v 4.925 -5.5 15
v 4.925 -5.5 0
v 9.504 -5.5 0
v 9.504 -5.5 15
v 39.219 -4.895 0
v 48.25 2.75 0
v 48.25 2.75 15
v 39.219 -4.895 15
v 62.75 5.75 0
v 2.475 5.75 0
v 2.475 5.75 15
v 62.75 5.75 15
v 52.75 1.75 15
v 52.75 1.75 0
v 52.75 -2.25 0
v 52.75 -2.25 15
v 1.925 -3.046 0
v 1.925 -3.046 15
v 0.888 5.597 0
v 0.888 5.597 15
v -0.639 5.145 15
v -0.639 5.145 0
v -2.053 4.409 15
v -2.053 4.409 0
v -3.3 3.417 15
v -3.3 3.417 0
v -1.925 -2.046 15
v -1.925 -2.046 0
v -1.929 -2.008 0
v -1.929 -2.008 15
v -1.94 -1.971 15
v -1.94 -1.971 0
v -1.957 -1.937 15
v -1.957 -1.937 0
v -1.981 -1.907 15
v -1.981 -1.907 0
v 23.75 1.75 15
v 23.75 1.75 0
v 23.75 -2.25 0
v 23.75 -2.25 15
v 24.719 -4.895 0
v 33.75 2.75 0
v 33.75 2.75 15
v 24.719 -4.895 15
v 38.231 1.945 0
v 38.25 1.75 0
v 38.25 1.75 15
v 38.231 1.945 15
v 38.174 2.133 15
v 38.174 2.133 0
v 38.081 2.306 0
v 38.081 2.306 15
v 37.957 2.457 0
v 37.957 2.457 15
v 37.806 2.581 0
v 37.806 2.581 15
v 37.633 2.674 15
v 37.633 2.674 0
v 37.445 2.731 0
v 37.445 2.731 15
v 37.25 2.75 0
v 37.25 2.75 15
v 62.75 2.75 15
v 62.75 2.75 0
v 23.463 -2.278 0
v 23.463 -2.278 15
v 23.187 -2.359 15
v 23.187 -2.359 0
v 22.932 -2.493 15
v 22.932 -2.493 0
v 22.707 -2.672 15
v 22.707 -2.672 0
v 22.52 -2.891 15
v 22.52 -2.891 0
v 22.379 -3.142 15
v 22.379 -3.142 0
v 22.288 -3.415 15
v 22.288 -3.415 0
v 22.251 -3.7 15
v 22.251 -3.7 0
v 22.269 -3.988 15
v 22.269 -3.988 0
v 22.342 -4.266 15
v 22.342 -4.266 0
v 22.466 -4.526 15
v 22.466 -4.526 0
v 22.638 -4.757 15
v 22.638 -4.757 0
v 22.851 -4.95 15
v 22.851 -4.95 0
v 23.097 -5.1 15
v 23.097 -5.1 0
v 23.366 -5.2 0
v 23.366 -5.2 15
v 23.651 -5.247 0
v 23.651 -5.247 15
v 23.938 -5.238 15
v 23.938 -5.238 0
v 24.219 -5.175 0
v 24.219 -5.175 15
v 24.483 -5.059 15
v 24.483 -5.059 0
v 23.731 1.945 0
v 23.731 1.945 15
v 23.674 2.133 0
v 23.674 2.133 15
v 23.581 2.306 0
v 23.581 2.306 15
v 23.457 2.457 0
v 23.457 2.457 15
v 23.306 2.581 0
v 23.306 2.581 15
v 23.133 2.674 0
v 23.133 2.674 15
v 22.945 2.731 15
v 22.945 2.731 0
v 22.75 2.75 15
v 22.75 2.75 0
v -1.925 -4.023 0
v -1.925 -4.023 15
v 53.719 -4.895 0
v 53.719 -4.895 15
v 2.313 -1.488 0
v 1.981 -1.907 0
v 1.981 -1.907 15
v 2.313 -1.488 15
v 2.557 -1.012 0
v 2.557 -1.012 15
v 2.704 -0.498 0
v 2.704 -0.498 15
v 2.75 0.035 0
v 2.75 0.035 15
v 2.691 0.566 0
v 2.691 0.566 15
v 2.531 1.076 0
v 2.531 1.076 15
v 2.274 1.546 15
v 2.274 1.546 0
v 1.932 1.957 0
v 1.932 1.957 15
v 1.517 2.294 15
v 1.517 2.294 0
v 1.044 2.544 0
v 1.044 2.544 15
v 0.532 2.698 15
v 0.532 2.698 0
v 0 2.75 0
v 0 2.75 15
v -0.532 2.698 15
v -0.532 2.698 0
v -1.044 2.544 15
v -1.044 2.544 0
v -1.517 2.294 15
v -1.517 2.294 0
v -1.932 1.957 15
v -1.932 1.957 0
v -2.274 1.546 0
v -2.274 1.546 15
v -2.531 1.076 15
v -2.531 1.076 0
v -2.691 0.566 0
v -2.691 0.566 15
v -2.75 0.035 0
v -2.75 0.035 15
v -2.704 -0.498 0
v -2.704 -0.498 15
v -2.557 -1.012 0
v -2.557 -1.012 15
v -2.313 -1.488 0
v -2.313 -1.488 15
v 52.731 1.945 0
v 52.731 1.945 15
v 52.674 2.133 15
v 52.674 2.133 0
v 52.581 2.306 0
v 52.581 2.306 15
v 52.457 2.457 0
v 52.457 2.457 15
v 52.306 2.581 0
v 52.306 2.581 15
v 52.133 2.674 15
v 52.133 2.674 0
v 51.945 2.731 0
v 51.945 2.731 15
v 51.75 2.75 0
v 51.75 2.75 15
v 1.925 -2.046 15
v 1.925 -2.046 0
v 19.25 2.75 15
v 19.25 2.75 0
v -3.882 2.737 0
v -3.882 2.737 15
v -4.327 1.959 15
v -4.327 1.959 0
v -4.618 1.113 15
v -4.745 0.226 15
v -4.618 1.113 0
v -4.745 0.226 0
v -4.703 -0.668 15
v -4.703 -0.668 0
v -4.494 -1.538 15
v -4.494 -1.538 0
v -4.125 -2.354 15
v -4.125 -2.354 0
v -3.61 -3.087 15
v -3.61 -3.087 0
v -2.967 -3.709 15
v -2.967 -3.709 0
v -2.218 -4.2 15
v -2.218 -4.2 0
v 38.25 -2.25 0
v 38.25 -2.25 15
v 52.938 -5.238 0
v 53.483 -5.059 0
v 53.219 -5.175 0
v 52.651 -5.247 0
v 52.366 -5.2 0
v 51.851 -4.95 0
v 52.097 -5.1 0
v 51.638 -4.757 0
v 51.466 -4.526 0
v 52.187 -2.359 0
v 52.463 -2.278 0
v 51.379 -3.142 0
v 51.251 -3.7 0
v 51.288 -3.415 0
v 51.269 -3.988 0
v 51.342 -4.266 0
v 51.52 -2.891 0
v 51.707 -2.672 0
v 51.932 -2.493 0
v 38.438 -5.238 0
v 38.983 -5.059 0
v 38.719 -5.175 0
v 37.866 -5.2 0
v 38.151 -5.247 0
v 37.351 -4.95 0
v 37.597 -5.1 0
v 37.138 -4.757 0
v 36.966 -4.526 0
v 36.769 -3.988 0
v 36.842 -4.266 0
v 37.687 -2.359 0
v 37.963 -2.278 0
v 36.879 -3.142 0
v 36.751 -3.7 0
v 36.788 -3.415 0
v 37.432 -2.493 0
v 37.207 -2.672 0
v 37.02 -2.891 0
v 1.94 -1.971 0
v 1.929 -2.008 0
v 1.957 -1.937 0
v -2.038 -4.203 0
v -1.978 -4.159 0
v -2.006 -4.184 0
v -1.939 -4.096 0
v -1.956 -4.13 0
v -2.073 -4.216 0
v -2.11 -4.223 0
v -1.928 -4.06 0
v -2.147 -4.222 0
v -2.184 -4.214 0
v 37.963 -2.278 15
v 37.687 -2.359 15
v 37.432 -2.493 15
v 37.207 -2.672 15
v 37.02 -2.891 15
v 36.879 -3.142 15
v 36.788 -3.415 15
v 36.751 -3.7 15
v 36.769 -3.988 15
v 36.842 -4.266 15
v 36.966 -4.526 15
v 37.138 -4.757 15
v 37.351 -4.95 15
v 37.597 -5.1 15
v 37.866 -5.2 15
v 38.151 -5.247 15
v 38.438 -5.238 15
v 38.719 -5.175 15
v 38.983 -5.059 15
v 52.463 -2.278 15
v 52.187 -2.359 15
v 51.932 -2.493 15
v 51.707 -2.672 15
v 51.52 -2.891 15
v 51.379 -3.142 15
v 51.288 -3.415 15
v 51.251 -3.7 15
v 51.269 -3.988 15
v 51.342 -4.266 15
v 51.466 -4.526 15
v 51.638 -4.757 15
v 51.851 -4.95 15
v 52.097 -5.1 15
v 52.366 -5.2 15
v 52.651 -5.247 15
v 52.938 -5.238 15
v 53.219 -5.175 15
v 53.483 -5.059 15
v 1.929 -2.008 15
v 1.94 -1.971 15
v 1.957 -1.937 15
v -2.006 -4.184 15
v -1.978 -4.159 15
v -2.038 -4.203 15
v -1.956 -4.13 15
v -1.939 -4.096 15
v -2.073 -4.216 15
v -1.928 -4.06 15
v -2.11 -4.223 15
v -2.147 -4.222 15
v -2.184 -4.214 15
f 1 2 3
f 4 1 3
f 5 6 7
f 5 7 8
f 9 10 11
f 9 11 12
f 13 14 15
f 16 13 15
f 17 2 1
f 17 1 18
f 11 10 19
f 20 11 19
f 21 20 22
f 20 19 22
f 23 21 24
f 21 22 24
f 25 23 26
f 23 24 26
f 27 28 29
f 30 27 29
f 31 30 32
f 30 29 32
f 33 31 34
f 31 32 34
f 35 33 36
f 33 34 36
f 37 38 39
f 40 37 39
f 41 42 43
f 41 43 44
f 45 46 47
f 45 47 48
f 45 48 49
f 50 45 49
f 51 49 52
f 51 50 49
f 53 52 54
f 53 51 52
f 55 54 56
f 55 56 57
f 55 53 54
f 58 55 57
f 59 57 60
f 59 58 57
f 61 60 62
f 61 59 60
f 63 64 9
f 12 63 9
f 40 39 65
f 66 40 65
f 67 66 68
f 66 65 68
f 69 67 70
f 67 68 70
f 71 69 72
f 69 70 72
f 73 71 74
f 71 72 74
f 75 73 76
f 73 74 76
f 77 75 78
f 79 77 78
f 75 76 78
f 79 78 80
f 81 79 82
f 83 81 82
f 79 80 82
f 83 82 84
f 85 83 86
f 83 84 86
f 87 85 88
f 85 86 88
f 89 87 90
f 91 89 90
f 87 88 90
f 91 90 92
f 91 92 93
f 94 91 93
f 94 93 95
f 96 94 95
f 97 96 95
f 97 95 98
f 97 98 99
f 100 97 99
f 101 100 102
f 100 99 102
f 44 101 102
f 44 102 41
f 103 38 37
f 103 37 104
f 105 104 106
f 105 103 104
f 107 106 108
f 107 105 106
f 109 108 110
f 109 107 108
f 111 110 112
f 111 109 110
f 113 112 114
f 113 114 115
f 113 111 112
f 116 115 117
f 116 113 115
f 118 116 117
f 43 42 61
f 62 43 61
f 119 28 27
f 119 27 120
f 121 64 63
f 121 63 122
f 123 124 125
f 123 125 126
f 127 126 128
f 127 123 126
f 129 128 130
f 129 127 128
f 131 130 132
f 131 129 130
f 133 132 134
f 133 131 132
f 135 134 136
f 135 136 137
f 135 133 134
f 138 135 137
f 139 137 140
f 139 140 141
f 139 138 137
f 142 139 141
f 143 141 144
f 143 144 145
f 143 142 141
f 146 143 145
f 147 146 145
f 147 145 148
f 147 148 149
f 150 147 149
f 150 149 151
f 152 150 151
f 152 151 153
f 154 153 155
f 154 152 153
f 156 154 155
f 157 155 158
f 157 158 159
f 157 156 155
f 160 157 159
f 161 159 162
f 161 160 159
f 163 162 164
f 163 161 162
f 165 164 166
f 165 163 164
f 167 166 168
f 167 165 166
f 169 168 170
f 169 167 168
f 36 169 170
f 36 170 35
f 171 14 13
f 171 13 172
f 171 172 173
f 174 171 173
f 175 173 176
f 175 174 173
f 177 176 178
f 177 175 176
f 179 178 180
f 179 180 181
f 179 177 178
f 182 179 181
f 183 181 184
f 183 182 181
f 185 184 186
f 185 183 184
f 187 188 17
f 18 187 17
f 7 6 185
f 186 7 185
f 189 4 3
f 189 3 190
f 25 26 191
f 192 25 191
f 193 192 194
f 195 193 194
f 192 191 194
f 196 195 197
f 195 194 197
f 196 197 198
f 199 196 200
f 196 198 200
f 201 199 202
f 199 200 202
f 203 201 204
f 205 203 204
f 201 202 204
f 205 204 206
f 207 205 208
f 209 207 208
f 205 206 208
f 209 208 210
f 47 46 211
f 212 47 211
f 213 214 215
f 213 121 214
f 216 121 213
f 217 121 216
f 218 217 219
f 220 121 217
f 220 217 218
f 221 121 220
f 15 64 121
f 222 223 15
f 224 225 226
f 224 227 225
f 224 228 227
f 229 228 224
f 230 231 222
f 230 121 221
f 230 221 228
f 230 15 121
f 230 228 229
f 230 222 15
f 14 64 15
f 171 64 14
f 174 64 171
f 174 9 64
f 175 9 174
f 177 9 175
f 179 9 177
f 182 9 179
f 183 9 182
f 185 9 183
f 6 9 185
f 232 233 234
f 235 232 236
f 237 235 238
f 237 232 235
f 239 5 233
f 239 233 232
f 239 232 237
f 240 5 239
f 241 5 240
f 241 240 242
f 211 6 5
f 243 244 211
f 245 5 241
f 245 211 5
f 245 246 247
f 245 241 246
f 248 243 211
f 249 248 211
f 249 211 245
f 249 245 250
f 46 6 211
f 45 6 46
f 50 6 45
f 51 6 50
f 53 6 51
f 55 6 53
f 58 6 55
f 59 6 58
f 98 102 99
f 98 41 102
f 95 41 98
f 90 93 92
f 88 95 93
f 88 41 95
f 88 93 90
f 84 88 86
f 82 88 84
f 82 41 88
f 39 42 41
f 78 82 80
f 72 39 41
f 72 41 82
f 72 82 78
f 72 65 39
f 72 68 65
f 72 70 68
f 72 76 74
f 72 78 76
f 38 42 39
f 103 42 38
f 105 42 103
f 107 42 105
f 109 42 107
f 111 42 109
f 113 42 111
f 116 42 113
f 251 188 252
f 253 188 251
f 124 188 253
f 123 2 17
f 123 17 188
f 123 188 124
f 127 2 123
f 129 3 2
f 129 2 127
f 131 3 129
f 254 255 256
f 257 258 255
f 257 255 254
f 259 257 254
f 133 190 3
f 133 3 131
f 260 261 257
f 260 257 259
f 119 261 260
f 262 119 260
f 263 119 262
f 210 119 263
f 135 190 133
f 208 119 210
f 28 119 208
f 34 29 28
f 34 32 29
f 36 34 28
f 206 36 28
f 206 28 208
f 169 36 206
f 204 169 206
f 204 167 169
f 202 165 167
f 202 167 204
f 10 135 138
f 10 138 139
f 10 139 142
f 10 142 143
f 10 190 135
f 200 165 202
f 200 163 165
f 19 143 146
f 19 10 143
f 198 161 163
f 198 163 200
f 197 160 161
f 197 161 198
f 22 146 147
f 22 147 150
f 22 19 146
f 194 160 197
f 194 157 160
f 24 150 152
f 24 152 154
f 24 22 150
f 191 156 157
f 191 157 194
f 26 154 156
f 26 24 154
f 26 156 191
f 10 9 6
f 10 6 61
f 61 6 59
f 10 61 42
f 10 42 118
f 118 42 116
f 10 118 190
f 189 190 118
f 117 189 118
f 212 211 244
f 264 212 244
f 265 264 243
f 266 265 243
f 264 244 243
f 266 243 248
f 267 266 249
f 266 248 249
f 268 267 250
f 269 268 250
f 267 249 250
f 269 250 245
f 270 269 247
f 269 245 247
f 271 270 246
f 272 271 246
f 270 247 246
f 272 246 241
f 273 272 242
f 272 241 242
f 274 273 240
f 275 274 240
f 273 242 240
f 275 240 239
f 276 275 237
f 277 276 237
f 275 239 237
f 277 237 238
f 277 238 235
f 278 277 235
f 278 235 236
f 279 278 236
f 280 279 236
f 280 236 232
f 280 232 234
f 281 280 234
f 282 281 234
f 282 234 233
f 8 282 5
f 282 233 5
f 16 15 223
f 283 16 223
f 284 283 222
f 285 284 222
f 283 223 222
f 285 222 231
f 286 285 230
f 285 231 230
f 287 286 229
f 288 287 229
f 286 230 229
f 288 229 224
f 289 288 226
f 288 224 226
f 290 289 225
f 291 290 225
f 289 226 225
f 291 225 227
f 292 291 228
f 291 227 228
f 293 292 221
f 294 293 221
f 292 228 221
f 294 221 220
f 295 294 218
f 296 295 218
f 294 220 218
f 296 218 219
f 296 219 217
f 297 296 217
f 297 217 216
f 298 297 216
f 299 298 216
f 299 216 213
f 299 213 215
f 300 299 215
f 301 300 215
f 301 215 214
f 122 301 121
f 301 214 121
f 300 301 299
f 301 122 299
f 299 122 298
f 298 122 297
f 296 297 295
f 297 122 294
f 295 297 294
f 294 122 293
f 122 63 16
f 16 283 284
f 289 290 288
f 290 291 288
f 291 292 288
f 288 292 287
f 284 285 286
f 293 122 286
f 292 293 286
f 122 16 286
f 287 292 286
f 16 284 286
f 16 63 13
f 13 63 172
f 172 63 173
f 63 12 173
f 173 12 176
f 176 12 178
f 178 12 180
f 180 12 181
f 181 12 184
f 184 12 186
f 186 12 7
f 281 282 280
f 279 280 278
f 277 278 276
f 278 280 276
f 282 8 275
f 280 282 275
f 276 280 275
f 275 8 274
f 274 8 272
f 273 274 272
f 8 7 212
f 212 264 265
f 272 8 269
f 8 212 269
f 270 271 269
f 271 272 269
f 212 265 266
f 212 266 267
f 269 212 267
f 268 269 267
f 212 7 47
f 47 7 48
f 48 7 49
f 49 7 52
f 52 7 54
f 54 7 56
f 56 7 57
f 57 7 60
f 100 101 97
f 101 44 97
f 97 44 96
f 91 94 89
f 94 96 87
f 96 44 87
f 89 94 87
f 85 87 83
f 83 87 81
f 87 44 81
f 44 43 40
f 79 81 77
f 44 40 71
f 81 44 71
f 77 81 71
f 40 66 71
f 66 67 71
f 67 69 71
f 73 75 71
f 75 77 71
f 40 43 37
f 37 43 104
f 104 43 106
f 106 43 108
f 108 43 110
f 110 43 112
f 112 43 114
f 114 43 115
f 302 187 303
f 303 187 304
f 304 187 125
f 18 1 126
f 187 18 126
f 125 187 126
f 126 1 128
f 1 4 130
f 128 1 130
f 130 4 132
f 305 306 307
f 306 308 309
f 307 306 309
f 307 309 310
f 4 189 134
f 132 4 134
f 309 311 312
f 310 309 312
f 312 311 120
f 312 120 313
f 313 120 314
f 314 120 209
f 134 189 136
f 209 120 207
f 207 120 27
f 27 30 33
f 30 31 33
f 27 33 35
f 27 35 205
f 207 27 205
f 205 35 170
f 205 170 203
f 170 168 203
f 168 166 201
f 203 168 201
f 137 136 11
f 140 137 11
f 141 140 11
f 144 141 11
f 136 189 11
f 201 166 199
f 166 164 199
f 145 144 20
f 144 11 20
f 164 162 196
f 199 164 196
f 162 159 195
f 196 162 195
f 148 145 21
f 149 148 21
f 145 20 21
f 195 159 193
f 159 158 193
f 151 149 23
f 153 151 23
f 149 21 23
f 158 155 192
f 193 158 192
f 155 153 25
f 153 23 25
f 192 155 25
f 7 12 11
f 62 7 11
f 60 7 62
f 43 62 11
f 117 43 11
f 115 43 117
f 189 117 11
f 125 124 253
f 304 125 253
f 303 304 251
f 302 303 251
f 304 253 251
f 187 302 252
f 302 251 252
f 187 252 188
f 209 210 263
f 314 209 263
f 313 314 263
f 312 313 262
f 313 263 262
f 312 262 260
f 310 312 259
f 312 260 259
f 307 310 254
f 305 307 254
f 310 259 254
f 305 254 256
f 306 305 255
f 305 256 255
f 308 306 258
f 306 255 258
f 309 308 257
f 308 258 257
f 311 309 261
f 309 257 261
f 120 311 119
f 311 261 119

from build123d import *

# Parameters (mm, degrees)
PAD_DEPTH = 15


with BuildPart() as part:
    # Sketch → Pad (new body)
    with BuildSketch(Plane.XY):
        with BuildLine():
            ThreePointArc((1.980932, -1.907461), (0, 2.75), (-1.980932, -1.907461))
            ThreePointArc((-1.925, -2.046185), (-1.939509, -1.971398), (-1.980932, -1.907461))
            Line((-1.925, -2.046185), (-1.925, -4.023292))
            ThreePointArc((-2.218407, -4.20014), (-2.021756, -4.194583), (-1.925, -4.023292))
            ThreePointArc((-3.3, 3.416504), (-4.70282, -0.667819), (-2.218407, -4.20014))
            ThreePointArc((2.474698, 5.75), (-0.639477, 5.144578), (-3.3, 3.416504))
            Line((2.474698, 5.75), (62.75, 5.75))
            Line((62.75, 2.75), (62.75, 5.75))
            Line((62.75, 2.75), (53.719164, -4.894867))
            ThreePointArc((52.75, -2.25), (51.341579, -4.266091), (53.719164, -4.894867))
            Line((52.75, 1.75), (52.75, -2.25))
            ThreePointArc((52.75, 1.75), (52.457107, 2.457107), (51.75, 2.75))
            Line((48.25, 2.75), (51.75, 2.75))
            Line((48.25, 2.75), (39.219164, -4.894867))
            ThreePointArc((38.25, -2.25), (36.841579, -4.266091), (39.219164, -4.894867))
            Line((38.25, 1.75), (38.25, -2.25))
            ThreePointArc((38.25, 1.75), (37.957107, 2.457107), (37.25, 2.75))
            Line((33.75, 2.75), (37.25, 2.75))
            Line((33.75, 2.75), (24.719164, -4.894867))
            ThreePointArc((23.75, -2.25), (22.341579, -4.266091), (24.719164, -4.894867))
            Line((23.75, 1.75), (23.75, -2.25))
            ThreePointArc((23.75, 1.75), (23.457107, 2.457107), (22.75, 2.75))
            Line((19.25, 2.75), (22.75, 2.75))
            Line((9.504324, -5.5), (19.25, 2.75))
            Line((4.925, -5.5), (9.504324, -5.5))
            Line((4.925, -5.5), (1.925, -3.046185))
            Line((1.925, -2.046185), (1.925, -3.046185))
            ThreePointArc((1.980932, -1.907461), (1.939509, -1.971398), (1.925, -2.046185))
        make_face()
    extrude(amount=PAD_DEPTH)


solid = part.part
